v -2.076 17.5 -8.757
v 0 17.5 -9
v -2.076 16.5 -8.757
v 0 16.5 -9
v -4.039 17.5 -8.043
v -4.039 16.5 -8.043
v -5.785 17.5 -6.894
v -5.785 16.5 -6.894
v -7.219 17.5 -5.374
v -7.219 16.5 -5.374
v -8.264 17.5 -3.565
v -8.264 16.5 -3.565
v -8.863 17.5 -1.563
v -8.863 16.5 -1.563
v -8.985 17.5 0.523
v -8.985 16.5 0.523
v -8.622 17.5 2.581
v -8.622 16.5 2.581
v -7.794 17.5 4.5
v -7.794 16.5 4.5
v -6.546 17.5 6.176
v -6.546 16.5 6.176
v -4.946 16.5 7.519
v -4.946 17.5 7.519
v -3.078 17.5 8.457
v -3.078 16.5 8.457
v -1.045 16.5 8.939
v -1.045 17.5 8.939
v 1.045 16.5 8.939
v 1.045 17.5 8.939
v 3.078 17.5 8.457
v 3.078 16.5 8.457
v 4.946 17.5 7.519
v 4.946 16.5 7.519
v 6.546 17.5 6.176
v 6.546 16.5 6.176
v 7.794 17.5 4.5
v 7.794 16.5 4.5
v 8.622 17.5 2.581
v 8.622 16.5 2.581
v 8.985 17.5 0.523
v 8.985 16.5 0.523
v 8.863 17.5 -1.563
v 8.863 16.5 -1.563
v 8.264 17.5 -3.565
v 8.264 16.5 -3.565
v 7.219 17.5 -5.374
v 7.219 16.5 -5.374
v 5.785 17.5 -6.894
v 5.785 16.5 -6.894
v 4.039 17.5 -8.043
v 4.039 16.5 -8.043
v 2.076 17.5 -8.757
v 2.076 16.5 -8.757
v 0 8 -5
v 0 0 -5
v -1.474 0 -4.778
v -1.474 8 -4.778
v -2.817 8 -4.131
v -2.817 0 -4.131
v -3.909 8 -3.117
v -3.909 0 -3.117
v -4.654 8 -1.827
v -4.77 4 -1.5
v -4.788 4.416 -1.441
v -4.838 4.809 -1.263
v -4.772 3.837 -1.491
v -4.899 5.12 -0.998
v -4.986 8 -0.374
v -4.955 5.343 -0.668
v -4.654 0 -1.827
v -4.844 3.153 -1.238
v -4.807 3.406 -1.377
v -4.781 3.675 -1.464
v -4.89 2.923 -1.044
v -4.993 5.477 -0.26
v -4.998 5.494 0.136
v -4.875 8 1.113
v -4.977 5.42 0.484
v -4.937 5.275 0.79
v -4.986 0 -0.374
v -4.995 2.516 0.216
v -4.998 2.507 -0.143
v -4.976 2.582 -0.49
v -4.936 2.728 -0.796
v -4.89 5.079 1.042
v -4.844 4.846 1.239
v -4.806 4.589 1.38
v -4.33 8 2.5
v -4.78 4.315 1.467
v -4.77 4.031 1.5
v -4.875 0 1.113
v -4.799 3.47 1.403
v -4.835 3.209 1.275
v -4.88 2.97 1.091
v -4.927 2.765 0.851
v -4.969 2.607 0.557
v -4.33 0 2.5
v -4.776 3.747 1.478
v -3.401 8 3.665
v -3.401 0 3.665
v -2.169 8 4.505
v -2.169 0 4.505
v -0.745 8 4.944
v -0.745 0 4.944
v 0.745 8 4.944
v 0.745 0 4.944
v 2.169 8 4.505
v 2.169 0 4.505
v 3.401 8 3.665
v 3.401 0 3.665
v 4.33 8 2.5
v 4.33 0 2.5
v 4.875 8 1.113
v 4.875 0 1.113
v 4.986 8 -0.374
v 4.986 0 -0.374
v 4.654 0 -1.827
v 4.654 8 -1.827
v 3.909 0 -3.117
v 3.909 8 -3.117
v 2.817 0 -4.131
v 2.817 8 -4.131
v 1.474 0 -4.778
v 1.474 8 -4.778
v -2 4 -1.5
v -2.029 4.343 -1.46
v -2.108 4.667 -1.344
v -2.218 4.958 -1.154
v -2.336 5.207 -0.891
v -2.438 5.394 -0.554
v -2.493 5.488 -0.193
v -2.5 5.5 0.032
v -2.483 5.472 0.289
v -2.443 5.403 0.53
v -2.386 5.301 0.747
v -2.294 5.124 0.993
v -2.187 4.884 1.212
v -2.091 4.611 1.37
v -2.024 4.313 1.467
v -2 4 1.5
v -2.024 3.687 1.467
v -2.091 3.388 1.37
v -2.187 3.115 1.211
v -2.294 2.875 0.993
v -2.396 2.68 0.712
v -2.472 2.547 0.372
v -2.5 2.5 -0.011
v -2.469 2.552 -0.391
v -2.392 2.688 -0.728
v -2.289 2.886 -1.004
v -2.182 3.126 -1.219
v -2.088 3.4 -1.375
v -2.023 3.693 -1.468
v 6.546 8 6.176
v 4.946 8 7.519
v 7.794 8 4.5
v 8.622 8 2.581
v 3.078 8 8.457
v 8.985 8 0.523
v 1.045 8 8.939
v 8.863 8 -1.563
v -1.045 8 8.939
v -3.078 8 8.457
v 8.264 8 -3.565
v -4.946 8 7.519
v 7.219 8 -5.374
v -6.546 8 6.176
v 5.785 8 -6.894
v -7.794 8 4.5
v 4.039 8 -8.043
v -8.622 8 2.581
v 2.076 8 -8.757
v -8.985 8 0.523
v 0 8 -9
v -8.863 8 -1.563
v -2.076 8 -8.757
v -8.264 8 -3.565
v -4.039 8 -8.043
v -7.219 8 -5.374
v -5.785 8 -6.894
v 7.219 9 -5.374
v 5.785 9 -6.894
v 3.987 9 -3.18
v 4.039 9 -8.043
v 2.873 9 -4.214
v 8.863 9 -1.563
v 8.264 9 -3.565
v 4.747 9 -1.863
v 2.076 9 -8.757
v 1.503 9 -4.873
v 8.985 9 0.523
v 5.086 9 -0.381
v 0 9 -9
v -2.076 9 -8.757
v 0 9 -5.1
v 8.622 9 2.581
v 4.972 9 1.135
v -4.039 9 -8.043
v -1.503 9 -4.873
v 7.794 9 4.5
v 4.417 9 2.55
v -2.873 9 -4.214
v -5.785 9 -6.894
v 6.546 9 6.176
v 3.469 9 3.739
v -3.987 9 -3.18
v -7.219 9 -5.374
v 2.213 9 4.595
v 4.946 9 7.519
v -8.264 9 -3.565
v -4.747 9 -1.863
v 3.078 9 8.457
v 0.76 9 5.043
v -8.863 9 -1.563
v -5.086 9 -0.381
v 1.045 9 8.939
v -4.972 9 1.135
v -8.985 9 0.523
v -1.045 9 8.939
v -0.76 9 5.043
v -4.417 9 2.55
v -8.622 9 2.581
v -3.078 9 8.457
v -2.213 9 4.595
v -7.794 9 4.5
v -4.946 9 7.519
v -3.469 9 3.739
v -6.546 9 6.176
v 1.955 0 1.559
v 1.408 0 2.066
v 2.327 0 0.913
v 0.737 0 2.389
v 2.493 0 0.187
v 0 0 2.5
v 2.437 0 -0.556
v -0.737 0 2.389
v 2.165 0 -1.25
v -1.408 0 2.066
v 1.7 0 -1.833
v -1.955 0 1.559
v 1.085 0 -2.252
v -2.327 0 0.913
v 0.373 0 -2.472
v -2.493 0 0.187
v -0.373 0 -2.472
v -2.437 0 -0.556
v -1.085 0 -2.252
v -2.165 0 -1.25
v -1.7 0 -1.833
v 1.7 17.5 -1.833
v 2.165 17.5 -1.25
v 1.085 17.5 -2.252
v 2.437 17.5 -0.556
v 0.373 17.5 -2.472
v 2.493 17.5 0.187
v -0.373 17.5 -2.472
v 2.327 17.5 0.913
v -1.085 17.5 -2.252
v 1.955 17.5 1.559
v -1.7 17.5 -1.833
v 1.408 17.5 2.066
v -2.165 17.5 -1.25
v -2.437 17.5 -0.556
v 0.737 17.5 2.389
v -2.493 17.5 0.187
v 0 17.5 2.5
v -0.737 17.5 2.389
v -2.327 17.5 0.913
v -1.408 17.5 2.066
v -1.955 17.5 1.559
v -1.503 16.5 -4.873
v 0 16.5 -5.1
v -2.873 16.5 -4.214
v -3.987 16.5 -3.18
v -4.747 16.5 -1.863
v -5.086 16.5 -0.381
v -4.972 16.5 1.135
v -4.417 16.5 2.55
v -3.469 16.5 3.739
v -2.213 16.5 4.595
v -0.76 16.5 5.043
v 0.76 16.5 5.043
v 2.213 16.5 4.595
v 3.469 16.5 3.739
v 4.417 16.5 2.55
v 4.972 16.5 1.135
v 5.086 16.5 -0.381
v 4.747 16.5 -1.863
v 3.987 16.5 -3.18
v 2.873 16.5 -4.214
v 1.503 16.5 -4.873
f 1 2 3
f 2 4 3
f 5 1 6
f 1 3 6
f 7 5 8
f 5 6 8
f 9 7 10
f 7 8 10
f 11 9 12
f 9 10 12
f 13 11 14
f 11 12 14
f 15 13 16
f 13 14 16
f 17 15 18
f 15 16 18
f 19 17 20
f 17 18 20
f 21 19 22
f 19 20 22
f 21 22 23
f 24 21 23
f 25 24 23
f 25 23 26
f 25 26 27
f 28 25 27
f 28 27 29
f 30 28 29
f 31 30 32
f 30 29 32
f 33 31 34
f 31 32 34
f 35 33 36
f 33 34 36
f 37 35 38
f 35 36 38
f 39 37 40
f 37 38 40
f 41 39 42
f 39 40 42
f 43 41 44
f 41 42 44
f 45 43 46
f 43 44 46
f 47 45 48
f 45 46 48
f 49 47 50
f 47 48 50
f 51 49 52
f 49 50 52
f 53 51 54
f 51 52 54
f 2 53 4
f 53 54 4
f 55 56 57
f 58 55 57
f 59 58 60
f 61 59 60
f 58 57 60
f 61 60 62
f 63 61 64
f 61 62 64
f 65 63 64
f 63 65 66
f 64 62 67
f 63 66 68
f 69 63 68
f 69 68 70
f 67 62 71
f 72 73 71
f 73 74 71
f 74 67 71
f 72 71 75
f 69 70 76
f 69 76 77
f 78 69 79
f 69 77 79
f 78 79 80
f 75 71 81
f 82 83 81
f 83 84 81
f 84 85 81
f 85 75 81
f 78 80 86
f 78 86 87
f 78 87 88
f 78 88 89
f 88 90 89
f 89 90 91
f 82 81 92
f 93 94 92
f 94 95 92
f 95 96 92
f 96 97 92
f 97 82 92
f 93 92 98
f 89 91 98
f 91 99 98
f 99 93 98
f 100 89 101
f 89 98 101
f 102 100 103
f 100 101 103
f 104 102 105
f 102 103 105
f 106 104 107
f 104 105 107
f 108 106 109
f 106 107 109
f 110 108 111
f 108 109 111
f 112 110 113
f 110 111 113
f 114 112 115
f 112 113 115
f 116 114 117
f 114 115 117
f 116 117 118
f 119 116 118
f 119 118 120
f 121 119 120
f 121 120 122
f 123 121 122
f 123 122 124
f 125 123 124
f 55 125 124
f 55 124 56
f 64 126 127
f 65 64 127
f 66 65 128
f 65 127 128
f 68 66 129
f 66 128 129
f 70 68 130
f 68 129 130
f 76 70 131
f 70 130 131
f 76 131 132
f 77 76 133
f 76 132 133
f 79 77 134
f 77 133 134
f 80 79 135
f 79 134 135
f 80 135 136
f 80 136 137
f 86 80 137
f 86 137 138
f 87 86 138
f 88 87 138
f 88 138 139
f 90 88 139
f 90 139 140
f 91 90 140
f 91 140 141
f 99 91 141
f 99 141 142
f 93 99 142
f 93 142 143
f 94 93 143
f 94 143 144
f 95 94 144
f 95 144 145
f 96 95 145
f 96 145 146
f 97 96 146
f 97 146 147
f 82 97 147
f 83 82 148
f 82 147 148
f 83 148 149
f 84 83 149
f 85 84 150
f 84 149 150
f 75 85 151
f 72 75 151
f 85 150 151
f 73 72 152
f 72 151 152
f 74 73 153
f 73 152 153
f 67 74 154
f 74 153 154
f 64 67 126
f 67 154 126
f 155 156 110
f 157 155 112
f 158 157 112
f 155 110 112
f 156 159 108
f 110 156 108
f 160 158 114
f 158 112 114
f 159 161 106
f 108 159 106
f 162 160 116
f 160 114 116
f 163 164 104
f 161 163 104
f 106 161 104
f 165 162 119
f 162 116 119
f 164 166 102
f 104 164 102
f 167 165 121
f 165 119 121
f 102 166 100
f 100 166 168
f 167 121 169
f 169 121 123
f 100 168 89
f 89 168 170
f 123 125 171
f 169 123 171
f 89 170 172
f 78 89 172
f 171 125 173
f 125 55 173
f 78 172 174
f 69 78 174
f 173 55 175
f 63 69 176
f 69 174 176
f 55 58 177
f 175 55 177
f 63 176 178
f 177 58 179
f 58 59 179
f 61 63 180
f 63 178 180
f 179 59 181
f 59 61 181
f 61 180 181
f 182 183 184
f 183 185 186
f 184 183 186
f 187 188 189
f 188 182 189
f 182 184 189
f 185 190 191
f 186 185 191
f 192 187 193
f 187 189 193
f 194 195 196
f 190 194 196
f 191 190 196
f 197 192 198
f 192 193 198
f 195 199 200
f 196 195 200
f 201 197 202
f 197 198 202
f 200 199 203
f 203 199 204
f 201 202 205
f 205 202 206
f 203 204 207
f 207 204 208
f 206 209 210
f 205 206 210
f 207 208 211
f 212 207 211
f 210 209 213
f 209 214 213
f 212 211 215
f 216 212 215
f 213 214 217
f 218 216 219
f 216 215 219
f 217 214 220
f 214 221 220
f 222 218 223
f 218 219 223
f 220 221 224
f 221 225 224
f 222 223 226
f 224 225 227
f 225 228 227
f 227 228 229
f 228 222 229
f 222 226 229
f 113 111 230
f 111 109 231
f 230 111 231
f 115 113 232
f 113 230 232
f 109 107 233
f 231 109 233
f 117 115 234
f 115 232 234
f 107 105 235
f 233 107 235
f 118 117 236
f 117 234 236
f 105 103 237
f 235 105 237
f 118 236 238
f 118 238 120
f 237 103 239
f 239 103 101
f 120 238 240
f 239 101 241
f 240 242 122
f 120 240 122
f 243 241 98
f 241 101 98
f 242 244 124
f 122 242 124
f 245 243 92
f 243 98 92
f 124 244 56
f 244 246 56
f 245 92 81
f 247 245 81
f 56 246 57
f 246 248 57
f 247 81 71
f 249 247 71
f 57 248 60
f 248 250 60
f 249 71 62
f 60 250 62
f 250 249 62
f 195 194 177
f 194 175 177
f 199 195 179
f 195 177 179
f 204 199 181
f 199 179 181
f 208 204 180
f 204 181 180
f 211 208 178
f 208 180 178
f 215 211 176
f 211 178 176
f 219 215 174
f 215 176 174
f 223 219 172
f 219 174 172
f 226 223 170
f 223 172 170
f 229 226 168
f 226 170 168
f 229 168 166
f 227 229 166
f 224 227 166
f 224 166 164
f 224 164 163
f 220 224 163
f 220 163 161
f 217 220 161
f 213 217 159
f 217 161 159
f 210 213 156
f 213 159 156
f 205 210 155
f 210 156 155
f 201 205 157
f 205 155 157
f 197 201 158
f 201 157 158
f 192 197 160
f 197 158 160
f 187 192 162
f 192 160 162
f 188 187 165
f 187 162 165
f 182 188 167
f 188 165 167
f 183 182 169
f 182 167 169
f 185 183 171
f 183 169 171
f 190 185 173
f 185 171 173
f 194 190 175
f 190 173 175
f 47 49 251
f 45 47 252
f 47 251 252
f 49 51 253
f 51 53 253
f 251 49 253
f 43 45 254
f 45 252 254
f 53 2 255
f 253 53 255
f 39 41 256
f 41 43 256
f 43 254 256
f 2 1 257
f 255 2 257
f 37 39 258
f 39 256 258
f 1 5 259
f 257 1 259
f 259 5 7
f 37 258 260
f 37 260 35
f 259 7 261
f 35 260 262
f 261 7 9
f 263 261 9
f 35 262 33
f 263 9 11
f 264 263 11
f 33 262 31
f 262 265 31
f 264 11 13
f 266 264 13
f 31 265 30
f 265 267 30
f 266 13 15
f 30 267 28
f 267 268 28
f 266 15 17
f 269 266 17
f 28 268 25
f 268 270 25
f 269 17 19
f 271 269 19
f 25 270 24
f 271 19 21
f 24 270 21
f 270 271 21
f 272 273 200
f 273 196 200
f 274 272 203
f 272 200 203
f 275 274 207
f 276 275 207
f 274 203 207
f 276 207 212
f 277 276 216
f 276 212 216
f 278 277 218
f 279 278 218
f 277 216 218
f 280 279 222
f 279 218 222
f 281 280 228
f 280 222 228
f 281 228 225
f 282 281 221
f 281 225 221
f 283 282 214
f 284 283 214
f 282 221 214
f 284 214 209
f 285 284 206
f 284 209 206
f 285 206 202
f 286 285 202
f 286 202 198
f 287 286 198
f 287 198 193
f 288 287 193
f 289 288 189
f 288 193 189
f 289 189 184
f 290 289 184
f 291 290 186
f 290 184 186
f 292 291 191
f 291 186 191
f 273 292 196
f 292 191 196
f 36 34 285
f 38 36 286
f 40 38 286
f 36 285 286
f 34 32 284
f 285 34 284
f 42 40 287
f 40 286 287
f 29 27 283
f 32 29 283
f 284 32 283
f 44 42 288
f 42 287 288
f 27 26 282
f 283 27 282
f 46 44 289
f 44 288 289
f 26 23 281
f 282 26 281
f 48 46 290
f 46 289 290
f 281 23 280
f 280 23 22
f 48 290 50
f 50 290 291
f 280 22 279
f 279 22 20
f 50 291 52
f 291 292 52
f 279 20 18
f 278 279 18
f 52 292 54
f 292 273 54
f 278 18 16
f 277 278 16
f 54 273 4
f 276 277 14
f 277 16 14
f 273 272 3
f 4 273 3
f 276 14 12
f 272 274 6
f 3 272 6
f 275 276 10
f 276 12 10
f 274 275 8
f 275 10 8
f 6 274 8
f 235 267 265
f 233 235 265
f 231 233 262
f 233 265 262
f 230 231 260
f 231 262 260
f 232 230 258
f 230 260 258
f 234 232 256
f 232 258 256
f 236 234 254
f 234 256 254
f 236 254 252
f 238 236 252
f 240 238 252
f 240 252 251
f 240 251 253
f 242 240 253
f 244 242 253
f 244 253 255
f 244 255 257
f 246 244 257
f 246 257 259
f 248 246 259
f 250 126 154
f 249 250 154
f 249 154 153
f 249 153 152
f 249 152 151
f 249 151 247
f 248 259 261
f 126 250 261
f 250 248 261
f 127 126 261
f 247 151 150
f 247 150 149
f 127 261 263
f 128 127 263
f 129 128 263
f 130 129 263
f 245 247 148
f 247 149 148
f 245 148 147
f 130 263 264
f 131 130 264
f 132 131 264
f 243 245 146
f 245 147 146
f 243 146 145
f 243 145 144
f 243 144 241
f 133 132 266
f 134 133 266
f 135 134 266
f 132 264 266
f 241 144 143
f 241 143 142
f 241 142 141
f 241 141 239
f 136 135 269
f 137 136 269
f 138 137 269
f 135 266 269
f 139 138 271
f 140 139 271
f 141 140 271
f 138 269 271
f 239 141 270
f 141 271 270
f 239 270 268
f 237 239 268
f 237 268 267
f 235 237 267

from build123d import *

# Parameters (mm, degrees)
SKETCH3_R               = 2.5
CUT_EXTRUDE2_DEPTH      = 22.639085008
CUT_EXTRUDE3_REACH      = 23.639
CUT_EXTRUDE3_END_RADIUS = 5
SKETCH4_R               = 1.5


with BuildPart() as part:
    # Sketch1 → Revolve1 (revolve)
    with BuildSketch(Plane.XY, mode=Mode.PRIVATE) as revolve1_sk:
        Polygon((0, 0), (0, 17.5), (9, 17.5), (9, 16.5), (5.1, 16.5), (5.1, 9), (9, 9), (9, 8), (5, 8), (5, 0), align=None)
    revolve(revolve1_sk.sketch.rotate(Axis((0, 0, 0), (0, 1, 0)), 90), axis=Axis((0, 0, 0), (0, 1, 0)))

    # Sketch3 → Cut-Extrude2 (cut, through all)
    with BuildSketch(Plane(origin=(0, 17.5, 0), x_dir=(1, 0, 0), z_dir=(0, 1, 0))):
        with Locations(Location((0, 0, 0), (0, 0, 270))):
            Circle(SKETCH3_R)
    extrude(amount=-CUT_EXTRUDE2_DEPTH, mode=Mode.SUBTRACT)

    # Cut-Extrude3: up to this cylinder (the profile starts inside it)
    cut_extrude3_end = Plane(origin=(0, 4, 0), z_dir=(0, -1, 0)) * Cylinder(CUT_EXTRUDE3_END_RADIUS, 58.278, mode=Mode.PRIVATE)
    # Sketch4 → Cut-Extrude3 (cut, up to the surface)
    with BuildSketch(Plane(origin=(0, 0, 0), x_dir=(0, 0, -1), z_dir=(1, 0, 0)), mode=Mode.PRIVATE) as cut_extrude3_sk1:
        with Locations((0, 4)):
            Circle(SKETCH4_R)
    cut_extrude3_tool1 = extrude(cut_extrude3_sk1.sketch, amount=-CUT_EXTRUDE3_REACH, mode=Mode.PRIVATE) & cut_extrude3_end
    add(cut_extrude3_tool1.solids().sort_by_distance((0, 4, 0))[0], mode=Mode.SUBTRACT)


solid = part.part
